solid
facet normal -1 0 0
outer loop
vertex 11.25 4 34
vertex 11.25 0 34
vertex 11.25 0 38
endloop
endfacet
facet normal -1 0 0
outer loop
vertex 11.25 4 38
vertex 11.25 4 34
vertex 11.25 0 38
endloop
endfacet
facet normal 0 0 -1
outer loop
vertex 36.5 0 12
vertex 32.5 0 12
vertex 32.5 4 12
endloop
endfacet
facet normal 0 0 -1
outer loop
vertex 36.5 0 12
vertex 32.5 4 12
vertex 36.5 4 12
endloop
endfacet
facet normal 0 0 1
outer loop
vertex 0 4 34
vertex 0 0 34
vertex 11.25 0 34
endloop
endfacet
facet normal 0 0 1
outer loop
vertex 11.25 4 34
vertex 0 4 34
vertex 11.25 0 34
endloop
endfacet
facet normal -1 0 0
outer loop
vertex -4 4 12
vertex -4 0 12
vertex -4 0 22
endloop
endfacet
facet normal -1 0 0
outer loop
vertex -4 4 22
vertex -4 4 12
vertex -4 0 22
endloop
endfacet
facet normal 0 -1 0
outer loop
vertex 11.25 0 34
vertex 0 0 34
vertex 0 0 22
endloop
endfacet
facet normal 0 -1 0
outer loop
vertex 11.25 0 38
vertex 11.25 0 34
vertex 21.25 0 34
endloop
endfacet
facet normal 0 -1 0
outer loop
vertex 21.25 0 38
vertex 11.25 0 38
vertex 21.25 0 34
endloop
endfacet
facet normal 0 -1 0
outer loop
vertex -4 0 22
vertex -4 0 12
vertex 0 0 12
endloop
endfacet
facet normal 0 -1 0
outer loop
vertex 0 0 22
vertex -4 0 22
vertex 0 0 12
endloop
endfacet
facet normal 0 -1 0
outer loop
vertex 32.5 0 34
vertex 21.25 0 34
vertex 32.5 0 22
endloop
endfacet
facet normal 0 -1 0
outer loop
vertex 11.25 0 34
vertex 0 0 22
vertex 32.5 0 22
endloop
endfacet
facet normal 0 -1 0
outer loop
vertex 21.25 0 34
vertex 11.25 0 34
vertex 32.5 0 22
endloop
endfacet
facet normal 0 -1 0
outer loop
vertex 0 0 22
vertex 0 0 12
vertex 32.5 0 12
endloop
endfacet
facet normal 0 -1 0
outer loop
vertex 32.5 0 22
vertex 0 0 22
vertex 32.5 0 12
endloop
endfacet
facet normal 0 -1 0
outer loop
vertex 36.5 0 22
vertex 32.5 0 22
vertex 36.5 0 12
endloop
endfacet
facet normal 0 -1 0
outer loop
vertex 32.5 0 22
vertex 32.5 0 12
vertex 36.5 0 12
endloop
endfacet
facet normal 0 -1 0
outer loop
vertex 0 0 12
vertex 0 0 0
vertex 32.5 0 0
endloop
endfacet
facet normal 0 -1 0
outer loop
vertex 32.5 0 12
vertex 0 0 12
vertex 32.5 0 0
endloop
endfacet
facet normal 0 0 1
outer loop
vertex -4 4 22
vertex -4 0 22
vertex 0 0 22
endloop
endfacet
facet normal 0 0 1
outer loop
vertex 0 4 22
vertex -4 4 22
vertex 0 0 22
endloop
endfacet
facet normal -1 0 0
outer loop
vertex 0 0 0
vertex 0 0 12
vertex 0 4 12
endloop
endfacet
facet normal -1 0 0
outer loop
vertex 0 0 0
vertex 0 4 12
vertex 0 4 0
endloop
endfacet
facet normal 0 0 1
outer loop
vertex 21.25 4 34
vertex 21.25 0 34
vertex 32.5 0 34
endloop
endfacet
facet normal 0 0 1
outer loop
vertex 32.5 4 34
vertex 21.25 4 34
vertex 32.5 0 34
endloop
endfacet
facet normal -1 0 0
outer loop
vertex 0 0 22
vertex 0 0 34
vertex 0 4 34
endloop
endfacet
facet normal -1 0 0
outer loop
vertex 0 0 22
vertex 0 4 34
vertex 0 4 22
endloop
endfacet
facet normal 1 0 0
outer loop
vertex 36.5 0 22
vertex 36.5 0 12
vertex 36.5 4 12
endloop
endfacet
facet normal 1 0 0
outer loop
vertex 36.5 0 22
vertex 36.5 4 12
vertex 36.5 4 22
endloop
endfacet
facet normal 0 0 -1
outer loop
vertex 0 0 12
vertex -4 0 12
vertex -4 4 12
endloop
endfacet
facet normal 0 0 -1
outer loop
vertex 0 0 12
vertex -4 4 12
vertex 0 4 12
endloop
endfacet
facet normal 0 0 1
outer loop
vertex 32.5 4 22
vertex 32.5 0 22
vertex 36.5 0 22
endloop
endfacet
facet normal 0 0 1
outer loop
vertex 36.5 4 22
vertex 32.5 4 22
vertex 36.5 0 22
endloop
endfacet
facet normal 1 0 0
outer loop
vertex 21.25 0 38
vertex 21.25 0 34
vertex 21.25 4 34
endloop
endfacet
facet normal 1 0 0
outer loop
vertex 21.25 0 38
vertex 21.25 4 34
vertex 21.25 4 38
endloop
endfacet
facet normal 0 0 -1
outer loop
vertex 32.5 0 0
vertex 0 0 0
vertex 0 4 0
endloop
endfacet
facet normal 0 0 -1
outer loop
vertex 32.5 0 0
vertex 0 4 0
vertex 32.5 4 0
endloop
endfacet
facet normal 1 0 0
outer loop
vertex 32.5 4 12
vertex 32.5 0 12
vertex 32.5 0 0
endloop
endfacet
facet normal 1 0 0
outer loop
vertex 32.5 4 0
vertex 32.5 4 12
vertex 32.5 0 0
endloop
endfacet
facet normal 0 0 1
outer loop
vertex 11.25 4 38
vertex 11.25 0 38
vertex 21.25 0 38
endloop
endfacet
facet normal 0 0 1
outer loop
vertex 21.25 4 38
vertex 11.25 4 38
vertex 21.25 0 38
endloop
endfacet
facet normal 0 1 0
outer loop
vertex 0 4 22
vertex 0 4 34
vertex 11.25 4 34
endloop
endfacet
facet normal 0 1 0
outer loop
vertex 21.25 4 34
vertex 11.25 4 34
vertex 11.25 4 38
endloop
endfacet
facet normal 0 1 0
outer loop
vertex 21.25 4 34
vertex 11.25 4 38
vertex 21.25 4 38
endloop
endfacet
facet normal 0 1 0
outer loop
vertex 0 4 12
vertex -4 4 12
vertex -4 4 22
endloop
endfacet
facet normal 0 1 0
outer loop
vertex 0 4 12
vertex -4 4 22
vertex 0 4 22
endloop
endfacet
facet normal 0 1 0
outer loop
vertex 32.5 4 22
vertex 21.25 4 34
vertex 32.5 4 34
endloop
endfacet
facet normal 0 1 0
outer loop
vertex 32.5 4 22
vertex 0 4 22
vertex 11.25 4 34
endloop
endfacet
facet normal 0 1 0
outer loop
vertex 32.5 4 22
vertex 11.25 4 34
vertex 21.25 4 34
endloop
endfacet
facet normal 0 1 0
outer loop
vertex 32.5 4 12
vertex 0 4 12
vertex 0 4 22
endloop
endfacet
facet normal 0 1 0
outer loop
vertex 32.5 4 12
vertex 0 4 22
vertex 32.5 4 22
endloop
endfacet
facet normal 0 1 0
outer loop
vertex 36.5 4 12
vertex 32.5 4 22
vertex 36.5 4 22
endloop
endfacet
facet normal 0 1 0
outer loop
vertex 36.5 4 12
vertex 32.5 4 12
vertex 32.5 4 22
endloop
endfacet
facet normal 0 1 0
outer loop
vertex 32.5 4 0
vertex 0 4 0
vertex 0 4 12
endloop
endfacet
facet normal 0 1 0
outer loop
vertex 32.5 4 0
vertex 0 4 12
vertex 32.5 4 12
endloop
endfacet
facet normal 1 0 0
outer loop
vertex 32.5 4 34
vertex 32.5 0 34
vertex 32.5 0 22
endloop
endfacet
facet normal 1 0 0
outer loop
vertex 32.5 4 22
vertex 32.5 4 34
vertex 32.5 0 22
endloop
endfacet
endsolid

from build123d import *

# Parameters (mm, degrees)
SKETCH1_W           = 32.5
SKETCH1_H           = 34
BOSS_EXTRUDE1_DEPTH = 4
SKETCH2_W           = 10
SKETCH2_H           = 4
SKETCH2_W_2         = 4
SKETCH2_H_2         = 10
BOSS_EXTRUDE2_DEPTH = 4


with BuildPart() as part:
    # Sketch1 → Boss-Extrude1 (new body)
    with BuildSketch(Plane(origin=(0, 0, 0), x_dir=(1, 0, 0), z_dir=(0, 1, 0))):
        with Locations((16.25, -17)):
            Rectangle(SKETCH1_W, SKETCH1_H)
    extrude(amount=BOSS_EXTRUDE1_DEPTH)

    # Sketch2 → Boss-Extrude2 (add, through all)
    with BuildSketch(Plane.XZ):
        with Locations((16.25, 36)):
            Rectangle(SKETCH2_W, SKETCH2_H)
        with Locations((34.5, 17)):
            Rectangle(SKETCH2_W_2, SKETCH2_H_2)
        with Locations((-2, 17)):
            Rectangle(SKETCH2_W_2, SKETCH2_H_2)
    extrude(amount=-BOSS_EXTRUDE2_DEPTH)


solid = part.part
